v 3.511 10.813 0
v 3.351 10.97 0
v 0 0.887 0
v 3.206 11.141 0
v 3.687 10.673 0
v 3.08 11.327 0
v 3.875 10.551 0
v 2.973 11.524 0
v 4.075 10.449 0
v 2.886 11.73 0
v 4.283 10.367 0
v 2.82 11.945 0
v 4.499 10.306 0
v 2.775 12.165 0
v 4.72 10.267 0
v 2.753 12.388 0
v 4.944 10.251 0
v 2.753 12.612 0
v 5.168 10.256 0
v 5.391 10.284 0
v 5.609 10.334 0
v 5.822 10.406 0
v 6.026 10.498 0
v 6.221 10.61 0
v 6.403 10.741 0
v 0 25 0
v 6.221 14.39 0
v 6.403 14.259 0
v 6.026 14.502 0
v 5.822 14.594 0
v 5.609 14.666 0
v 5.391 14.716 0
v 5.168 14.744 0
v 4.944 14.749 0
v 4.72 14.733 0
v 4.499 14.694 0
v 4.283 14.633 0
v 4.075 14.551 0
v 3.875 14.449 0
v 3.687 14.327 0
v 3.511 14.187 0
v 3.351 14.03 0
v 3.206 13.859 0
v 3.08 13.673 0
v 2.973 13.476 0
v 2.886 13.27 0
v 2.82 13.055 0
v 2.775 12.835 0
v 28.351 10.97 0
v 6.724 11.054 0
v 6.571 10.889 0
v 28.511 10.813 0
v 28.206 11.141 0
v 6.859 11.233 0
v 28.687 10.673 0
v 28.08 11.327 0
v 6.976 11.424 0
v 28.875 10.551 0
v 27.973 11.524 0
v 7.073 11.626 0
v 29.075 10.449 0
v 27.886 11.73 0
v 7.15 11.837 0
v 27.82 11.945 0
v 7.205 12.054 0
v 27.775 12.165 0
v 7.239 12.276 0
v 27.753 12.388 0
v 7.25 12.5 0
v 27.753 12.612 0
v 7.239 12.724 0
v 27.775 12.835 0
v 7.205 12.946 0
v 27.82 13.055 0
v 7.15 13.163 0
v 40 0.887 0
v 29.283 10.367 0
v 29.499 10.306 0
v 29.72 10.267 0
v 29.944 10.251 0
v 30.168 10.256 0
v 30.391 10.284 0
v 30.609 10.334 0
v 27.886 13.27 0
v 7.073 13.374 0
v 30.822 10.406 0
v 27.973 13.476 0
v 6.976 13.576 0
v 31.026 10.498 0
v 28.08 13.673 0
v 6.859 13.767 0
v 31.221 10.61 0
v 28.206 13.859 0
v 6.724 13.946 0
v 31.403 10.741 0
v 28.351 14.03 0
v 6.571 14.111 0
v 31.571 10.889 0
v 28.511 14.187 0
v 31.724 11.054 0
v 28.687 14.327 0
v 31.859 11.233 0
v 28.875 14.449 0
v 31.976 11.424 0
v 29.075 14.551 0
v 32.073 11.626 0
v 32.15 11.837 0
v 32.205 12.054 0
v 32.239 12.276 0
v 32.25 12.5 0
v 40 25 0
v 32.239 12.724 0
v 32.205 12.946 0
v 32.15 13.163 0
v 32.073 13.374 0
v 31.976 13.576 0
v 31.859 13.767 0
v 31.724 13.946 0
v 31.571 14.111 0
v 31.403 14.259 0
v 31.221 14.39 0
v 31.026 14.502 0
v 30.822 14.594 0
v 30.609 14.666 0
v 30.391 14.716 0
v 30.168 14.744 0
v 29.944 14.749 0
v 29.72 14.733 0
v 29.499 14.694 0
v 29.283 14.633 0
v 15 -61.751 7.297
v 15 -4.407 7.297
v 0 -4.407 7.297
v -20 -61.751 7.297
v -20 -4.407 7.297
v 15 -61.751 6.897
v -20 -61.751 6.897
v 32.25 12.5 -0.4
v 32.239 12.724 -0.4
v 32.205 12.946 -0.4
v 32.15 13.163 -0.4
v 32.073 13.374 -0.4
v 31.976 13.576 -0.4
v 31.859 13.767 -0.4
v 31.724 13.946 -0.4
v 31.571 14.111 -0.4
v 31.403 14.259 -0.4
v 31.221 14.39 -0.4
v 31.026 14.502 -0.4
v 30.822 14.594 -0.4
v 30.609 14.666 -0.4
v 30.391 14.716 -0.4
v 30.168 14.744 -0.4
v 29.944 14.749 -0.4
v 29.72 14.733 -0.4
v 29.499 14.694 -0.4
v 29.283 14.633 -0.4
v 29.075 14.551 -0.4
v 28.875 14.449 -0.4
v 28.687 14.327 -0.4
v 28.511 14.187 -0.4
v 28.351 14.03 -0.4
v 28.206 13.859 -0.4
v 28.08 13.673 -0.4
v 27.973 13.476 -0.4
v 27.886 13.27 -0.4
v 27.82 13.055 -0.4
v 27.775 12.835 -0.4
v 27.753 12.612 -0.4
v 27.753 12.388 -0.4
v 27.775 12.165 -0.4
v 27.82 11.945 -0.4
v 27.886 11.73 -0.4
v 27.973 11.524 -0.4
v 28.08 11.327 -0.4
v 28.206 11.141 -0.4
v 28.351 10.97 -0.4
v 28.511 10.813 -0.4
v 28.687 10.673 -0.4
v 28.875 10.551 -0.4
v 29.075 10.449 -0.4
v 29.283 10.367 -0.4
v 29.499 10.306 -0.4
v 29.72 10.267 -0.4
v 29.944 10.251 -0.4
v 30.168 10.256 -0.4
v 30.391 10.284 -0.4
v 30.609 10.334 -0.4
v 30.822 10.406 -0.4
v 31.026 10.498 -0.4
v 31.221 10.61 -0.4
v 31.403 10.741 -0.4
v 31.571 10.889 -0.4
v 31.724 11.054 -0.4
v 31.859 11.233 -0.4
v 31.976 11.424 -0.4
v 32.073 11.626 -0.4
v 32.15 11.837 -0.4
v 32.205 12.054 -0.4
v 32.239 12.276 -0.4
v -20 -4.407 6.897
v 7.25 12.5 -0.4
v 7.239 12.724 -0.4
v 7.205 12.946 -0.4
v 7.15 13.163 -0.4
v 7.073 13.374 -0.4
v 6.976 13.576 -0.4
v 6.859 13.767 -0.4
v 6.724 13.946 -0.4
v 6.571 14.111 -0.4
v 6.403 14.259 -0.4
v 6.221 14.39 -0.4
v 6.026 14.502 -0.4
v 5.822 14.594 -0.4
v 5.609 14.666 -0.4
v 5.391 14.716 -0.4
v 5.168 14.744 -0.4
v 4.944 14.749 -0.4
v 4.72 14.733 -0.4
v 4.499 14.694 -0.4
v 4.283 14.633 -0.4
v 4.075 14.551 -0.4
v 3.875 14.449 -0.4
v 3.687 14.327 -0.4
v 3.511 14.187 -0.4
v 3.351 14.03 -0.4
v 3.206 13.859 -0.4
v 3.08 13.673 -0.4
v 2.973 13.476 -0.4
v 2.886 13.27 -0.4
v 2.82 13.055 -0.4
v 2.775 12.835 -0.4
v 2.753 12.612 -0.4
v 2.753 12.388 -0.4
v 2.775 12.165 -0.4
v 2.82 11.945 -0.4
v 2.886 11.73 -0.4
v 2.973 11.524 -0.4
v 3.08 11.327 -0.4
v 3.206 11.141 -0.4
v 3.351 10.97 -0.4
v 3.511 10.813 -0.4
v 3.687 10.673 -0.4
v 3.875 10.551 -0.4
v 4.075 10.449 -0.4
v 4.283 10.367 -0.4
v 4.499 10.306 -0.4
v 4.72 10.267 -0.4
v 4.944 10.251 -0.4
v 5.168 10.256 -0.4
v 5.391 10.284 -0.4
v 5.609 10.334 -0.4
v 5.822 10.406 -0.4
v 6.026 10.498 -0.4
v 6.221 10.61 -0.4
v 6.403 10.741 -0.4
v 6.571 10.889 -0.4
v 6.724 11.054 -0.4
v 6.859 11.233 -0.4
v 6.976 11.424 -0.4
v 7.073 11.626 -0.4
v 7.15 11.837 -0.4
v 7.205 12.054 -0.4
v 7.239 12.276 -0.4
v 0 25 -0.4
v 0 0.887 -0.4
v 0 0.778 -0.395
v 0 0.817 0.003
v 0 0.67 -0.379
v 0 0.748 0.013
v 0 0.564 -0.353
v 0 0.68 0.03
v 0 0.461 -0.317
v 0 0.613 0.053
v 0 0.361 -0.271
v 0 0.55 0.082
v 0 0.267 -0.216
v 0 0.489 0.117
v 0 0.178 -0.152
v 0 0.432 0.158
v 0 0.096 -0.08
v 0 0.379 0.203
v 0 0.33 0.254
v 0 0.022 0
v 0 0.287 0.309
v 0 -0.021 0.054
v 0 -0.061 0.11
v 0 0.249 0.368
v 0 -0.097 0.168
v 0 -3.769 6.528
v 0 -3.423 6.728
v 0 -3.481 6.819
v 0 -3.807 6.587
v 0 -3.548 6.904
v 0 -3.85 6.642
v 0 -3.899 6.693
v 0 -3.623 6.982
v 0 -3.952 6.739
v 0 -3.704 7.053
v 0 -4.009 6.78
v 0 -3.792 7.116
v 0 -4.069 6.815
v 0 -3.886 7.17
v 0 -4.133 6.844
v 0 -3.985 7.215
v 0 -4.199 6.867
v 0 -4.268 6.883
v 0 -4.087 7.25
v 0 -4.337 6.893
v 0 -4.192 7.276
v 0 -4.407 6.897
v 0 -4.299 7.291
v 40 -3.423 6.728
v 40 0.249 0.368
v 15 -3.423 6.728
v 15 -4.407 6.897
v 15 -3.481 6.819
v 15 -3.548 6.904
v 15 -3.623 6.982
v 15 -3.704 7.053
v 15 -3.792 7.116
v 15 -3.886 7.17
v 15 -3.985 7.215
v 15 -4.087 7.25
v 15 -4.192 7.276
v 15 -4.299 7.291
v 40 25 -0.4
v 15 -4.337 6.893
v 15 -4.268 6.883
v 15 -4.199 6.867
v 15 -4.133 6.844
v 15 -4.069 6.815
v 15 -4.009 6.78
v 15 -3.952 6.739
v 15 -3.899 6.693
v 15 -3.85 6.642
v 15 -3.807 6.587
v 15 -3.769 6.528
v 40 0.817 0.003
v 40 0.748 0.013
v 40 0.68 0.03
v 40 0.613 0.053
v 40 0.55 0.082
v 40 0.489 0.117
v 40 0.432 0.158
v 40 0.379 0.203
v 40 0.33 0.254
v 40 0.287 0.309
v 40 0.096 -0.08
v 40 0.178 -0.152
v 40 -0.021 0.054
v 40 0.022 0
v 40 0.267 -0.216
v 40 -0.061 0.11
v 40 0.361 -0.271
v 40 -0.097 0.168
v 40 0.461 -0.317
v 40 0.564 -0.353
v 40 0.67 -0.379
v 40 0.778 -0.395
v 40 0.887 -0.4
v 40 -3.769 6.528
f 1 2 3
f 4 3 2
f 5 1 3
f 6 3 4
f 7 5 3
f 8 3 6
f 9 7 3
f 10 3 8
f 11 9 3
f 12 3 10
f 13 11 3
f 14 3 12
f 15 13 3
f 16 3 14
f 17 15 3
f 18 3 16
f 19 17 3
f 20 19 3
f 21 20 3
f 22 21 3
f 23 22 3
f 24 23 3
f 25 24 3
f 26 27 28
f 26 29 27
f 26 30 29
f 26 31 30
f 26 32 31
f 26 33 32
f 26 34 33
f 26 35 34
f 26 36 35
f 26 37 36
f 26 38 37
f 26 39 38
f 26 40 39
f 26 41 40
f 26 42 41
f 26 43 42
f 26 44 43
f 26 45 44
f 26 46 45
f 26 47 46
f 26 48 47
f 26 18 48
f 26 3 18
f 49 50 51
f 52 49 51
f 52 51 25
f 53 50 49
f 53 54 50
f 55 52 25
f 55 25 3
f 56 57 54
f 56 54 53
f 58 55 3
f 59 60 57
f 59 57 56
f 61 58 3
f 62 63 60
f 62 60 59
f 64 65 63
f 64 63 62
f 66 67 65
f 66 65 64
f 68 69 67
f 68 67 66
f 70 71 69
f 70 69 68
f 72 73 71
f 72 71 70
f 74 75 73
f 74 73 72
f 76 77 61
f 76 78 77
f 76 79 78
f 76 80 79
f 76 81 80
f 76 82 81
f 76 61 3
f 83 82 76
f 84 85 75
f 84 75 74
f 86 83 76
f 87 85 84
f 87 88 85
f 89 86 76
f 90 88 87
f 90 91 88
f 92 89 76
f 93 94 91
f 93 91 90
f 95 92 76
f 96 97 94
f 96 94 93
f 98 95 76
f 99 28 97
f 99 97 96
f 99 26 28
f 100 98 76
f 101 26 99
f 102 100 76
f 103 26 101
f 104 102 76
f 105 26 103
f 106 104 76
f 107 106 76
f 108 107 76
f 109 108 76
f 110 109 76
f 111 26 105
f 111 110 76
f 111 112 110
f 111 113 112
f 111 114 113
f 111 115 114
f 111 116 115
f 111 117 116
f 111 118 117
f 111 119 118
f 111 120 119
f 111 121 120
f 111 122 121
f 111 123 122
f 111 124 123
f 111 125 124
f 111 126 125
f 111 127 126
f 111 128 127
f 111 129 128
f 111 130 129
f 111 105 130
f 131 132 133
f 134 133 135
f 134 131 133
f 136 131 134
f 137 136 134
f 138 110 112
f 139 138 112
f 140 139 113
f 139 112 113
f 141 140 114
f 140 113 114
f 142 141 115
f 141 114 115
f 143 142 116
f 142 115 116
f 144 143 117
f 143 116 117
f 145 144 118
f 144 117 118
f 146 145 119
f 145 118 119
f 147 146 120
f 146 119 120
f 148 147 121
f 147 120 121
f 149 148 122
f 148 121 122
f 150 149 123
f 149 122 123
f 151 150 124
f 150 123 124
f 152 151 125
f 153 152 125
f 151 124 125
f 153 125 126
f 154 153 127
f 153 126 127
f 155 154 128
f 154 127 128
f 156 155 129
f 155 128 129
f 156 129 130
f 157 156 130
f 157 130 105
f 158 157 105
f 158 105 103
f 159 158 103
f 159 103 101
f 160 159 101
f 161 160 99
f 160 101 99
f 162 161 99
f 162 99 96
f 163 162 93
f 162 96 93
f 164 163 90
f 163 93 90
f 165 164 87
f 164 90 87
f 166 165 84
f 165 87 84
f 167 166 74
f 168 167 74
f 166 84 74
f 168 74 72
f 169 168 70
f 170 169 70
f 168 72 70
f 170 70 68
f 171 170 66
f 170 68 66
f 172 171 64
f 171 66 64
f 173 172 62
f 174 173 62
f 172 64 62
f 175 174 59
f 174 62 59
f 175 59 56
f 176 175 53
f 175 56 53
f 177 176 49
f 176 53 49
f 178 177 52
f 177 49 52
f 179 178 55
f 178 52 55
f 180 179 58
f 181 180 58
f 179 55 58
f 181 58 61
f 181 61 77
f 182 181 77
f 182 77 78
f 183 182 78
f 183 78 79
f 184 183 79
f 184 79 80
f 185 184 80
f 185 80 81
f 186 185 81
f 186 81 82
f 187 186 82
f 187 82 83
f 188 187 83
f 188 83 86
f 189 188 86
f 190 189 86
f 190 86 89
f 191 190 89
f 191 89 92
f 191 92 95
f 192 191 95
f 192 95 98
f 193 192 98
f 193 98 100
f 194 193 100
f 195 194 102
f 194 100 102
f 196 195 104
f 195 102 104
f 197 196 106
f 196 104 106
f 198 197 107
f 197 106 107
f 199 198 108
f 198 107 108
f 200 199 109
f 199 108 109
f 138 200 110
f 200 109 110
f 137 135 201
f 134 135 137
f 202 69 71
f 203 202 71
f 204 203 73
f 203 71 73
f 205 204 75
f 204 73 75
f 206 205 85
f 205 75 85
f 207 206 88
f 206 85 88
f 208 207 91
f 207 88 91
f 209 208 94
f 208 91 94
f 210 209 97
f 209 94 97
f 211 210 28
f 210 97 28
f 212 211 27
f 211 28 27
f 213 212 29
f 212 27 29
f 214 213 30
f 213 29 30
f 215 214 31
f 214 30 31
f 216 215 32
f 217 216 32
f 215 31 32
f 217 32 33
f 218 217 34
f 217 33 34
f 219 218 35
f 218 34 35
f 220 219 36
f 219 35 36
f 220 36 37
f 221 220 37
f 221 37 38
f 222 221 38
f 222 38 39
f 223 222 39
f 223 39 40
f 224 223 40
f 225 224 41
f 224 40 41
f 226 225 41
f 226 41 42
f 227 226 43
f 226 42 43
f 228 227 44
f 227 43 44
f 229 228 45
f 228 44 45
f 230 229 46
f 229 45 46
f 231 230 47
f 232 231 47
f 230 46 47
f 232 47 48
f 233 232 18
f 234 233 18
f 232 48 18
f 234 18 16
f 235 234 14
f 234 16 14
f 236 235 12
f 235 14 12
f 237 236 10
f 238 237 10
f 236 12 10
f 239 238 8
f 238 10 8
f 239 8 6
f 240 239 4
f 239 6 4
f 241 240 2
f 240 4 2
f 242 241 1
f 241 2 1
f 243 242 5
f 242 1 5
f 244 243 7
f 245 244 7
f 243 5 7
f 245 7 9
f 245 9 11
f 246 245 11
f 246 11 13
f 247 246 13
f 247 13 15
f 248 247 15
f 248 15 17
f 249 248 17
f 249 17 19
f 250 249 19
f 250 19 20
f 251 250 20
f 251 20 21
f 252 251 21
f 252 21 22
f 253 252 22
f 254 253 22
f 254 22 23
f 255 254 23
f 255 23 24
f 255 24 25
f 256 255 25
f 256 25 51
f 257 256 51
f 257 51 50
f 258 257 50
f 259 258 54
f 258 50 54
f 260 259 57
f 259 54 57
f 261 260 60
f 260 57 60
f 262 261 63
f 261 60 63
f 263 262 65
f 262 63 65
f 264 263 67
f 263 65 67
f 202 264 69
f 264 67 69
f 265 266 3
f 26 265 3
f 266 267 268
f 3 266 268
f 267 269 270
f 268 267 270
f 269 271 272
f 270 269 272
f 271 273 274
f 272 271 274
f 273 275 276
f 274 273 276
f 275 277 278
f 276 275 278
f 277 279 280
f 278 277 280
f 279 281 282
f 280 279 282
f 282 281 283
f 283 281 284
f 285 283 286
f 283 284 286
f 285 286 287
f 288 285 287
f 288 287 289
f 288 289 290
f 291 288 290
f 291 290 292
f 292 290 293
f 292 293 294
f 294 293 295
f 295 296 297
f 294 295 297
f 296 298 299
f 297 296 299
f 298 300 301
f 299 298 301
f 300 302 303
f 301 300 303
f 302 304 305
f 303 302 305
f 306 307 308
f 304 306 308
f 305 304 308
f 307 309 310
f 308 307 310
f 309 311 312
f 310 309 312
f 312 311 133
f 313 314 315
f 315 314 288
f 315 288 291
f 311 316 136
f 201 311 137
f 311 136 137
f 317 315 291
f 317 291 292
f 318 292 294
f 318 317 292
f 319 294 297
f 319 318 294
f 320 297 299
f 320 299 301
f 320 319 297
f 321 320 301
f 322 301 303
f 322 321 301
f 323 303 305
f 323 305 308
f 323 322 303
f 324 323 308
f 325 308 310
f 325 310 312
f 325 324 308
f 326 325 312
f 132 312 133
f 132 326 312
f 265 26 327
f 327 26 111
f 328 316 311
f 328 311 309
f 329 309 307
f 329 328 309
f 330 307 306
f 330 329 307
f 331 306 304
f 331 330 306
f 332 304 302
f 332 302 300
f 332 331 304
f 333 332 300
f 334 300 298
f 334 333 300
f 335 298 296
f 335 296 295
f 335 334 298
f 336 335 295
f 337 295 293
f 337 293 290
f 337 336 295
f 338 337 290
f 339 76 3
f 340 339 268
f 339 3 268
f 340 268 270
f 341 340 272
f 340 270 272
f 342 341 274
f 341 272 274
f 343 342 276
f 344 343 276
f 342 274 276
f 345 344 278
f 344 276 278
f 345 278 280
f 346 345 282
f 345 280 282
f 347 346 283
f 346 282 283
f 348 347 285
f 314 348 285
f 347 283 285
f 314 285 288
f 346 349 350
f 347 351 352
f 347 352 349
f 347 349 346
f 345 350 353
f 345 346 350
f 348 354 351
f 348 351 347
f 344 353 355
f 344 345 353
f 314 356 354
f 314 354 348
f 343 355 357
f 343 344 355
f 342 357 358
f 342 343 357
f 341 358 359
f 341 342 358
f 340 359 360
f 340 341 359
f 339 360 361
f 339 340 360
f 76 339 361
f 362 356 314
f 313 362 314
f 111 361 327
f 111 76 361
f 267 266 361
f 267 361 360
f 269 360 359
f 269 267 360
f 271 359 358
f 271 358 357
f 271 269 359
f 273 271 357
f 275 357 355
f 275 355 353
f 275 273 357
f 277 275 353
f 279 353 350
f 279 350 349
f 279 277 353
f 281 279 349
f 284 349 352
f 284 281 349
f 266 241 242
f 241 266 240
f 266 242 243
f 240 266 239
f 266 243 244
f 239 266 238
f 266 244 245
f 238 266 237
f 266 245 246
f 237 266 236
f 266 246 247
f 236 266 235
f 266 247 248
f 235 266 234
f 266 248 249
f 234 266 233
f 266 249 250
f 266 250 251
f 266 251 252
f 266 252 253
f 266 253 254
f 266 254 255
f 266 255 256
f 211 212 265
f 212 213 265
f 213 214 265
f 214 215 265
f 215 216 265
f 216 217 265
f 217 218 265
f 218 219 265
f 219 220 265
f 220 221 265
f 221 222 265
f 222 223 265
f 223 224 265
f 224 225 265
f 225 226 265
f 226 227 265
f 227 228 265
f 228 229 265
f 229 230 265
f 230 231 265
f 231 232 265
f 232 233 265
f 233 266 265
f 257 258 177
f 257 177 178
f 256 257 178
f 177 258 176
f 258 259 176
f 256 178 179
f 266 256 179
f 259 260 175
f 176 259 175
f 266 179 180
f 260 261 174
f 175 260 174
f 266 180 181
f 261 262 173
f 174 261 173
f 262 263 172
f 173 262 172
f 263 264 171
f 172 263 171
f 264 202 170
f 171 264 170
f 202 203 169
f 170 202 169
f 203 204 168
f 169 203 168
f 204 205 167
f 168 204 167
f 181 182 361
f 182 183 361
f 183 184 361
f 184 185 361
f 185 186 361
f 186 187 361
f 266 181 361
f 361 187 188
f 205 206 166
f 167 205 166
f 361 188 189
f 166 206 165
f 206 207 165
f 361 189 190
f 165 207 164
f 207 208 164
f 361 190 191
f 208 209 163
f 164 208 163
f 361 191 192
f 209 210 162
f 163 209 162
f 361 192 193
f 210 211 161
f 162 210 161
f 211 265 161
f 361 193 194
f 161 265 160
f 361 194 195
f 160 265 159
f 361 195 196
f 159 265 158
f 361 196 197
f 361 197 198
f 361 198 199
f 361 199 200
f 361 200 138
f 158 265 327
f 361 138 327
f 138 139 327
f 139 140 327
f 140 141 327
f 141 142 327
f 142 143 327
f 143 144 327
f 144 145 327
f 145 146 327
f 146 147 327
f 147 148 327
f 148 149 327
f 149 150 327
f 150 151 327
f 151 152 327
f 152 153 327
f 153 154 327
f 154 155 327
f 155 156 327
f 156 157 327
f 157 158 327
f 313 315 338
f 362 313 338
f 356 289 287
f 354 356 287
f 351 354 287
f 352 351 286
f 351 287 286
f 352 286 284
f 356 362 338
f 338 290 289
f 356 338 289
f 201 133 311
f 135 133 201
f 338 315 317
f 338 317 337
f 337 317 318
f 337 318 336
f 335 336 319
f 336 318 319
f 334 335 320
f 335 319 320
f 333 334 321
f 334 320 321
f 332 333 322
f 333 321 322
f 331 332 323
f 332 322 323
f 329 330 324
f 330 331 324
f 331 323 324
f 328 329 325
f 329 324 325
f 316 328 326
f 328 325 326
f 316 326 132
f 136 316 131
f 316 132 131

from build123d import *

# Parameters (mm, degrees)
SKETCH2_W               = 40
SKETCH2_H               = 25
SKETCH2_R               = 2.25
BASE_FLANGE1_DEPTH      = 0.4
EDGE_FLANGE1_DEPTH      = 40
EDGE_FLANGE1_2_DEPTH    = 40
EDGE_FLANGE2_DEPTH      = 15
EDGE_FLANGE2_START      = 0.4
EDGE_FLANGE2_PROFILE_W  = 35
EDGE_FLANGE2_PROFILE_H  = 57.343783684
EDGE_FLANGE2_FLAT_DEPTH = 0.4


# Read off the part's stored shape, not the designer's step: Edge-Flange1
# Sheet-metal steps are written as plain solids
with BuildPart() as part:
    # Sketch2 → Base-Flange1 (new body)
    with BuildSketch(Plane.XY):
        with Locations((20, 12.5)):
            Rectangle(SKETCH2_W, SKETCH2_H)
        with Locations((5, 12.5)):
            Circle(SKETCH2_R, mode=Mode.SUBTRACT)
        with Locations((30, 12.5)):
            Circle(SKETCH2_R, mode=Mode.SUBTRACT)
    extrude(amount=-BASE_FLANGE1_DEPTH)

    # Edge-Flange1 outline → Edge-Flange1 (cut)
    with BuildSketch(Plane.YZ):
        with BuildLine():
            ThreePointArc((0.887156424, -0.4), (0.410375552, -0.295165264), (0.021546812, 0))
            Line((0.021546812, 0), (0, 0))
            Line((0, 0), (0, -0.4))
            Line((0, -0.4), (0.887156424, -0.4))
        make_face()
    extrude(amount=EDGE_FLANGE1_DEPTH, mode=Mode.SUBTRACT)

    # Edge-Flange1 2 outline → Edge-Flange1 2 (add)
    with BuildSketch(Plane.YZ):
        with BuildLine():
            Line((-3.769059892, 6.52820323), (-0.09716805, 0.1683))
            ThreePointArc((-0.09716805, 0.1683), (-0.041630555, 0.081455507), (0.021546812, 0))
            Line((0.021546812, 0), (0.887156424, 0))
            ThreePointArc((0.887156424, 0), (0.518856424, 0.098685688), (0.249242111, 0.3683))
            Line((0.249242111, 0.3683), (-3.422649731, 6.72820323))
            Line((-3.422649731, 6.72820323), (-3.769059892, 6.52820323))
        make_face()
    extrude(amount=EDGE_FLANGE1_2_DEPTH)

    # Edge-Flange2 bend section (across the edge) → Edge-Flange2 (add)
    with BuildSketch(Plane(origin=(15, -3.981697996, 6.89650323), x_dir=(0, 0, -1), z_dir=(-1, 0, 0))):
        with BuildLine():
            Line((-0.4, 0.425276208), (0, 0.425276208))
            ThreePointArc((0, 0.425276208), (0.098685688, 0.056976208), (0.3683, -0.212638104))
            Line((0.3683, -0.212638104), (0.1683, -0.559048266))
            ThreePointArc((0.1683, -0.559048266), (-0.247724474, -0.143023792), (-0.4, 0.425276208))
        make_face()
    extrude(amount=EDGE_FLANGE2_DEPTH)

    # Edge-Flange2 profile (on flange) → Edge-Flange2 flat (add)
    with BuildSketch(Plane(origin=(0, -3.981697996, 6.89650323), x_dir=(-1, 0, 0), z_dir=(0, 0, 1)).offset(EDGE_FLANGE2_START)):
        with Locations((2.5, 29.09716805)):
            Rectangle(EDGE_FLANGE2_PROFILE_W, EDGE_FLANGE2_PROFILE_H)
    extrude(amount=-EDGE_FLANGE2_FLAT_DEPTH)


solid = part.part
